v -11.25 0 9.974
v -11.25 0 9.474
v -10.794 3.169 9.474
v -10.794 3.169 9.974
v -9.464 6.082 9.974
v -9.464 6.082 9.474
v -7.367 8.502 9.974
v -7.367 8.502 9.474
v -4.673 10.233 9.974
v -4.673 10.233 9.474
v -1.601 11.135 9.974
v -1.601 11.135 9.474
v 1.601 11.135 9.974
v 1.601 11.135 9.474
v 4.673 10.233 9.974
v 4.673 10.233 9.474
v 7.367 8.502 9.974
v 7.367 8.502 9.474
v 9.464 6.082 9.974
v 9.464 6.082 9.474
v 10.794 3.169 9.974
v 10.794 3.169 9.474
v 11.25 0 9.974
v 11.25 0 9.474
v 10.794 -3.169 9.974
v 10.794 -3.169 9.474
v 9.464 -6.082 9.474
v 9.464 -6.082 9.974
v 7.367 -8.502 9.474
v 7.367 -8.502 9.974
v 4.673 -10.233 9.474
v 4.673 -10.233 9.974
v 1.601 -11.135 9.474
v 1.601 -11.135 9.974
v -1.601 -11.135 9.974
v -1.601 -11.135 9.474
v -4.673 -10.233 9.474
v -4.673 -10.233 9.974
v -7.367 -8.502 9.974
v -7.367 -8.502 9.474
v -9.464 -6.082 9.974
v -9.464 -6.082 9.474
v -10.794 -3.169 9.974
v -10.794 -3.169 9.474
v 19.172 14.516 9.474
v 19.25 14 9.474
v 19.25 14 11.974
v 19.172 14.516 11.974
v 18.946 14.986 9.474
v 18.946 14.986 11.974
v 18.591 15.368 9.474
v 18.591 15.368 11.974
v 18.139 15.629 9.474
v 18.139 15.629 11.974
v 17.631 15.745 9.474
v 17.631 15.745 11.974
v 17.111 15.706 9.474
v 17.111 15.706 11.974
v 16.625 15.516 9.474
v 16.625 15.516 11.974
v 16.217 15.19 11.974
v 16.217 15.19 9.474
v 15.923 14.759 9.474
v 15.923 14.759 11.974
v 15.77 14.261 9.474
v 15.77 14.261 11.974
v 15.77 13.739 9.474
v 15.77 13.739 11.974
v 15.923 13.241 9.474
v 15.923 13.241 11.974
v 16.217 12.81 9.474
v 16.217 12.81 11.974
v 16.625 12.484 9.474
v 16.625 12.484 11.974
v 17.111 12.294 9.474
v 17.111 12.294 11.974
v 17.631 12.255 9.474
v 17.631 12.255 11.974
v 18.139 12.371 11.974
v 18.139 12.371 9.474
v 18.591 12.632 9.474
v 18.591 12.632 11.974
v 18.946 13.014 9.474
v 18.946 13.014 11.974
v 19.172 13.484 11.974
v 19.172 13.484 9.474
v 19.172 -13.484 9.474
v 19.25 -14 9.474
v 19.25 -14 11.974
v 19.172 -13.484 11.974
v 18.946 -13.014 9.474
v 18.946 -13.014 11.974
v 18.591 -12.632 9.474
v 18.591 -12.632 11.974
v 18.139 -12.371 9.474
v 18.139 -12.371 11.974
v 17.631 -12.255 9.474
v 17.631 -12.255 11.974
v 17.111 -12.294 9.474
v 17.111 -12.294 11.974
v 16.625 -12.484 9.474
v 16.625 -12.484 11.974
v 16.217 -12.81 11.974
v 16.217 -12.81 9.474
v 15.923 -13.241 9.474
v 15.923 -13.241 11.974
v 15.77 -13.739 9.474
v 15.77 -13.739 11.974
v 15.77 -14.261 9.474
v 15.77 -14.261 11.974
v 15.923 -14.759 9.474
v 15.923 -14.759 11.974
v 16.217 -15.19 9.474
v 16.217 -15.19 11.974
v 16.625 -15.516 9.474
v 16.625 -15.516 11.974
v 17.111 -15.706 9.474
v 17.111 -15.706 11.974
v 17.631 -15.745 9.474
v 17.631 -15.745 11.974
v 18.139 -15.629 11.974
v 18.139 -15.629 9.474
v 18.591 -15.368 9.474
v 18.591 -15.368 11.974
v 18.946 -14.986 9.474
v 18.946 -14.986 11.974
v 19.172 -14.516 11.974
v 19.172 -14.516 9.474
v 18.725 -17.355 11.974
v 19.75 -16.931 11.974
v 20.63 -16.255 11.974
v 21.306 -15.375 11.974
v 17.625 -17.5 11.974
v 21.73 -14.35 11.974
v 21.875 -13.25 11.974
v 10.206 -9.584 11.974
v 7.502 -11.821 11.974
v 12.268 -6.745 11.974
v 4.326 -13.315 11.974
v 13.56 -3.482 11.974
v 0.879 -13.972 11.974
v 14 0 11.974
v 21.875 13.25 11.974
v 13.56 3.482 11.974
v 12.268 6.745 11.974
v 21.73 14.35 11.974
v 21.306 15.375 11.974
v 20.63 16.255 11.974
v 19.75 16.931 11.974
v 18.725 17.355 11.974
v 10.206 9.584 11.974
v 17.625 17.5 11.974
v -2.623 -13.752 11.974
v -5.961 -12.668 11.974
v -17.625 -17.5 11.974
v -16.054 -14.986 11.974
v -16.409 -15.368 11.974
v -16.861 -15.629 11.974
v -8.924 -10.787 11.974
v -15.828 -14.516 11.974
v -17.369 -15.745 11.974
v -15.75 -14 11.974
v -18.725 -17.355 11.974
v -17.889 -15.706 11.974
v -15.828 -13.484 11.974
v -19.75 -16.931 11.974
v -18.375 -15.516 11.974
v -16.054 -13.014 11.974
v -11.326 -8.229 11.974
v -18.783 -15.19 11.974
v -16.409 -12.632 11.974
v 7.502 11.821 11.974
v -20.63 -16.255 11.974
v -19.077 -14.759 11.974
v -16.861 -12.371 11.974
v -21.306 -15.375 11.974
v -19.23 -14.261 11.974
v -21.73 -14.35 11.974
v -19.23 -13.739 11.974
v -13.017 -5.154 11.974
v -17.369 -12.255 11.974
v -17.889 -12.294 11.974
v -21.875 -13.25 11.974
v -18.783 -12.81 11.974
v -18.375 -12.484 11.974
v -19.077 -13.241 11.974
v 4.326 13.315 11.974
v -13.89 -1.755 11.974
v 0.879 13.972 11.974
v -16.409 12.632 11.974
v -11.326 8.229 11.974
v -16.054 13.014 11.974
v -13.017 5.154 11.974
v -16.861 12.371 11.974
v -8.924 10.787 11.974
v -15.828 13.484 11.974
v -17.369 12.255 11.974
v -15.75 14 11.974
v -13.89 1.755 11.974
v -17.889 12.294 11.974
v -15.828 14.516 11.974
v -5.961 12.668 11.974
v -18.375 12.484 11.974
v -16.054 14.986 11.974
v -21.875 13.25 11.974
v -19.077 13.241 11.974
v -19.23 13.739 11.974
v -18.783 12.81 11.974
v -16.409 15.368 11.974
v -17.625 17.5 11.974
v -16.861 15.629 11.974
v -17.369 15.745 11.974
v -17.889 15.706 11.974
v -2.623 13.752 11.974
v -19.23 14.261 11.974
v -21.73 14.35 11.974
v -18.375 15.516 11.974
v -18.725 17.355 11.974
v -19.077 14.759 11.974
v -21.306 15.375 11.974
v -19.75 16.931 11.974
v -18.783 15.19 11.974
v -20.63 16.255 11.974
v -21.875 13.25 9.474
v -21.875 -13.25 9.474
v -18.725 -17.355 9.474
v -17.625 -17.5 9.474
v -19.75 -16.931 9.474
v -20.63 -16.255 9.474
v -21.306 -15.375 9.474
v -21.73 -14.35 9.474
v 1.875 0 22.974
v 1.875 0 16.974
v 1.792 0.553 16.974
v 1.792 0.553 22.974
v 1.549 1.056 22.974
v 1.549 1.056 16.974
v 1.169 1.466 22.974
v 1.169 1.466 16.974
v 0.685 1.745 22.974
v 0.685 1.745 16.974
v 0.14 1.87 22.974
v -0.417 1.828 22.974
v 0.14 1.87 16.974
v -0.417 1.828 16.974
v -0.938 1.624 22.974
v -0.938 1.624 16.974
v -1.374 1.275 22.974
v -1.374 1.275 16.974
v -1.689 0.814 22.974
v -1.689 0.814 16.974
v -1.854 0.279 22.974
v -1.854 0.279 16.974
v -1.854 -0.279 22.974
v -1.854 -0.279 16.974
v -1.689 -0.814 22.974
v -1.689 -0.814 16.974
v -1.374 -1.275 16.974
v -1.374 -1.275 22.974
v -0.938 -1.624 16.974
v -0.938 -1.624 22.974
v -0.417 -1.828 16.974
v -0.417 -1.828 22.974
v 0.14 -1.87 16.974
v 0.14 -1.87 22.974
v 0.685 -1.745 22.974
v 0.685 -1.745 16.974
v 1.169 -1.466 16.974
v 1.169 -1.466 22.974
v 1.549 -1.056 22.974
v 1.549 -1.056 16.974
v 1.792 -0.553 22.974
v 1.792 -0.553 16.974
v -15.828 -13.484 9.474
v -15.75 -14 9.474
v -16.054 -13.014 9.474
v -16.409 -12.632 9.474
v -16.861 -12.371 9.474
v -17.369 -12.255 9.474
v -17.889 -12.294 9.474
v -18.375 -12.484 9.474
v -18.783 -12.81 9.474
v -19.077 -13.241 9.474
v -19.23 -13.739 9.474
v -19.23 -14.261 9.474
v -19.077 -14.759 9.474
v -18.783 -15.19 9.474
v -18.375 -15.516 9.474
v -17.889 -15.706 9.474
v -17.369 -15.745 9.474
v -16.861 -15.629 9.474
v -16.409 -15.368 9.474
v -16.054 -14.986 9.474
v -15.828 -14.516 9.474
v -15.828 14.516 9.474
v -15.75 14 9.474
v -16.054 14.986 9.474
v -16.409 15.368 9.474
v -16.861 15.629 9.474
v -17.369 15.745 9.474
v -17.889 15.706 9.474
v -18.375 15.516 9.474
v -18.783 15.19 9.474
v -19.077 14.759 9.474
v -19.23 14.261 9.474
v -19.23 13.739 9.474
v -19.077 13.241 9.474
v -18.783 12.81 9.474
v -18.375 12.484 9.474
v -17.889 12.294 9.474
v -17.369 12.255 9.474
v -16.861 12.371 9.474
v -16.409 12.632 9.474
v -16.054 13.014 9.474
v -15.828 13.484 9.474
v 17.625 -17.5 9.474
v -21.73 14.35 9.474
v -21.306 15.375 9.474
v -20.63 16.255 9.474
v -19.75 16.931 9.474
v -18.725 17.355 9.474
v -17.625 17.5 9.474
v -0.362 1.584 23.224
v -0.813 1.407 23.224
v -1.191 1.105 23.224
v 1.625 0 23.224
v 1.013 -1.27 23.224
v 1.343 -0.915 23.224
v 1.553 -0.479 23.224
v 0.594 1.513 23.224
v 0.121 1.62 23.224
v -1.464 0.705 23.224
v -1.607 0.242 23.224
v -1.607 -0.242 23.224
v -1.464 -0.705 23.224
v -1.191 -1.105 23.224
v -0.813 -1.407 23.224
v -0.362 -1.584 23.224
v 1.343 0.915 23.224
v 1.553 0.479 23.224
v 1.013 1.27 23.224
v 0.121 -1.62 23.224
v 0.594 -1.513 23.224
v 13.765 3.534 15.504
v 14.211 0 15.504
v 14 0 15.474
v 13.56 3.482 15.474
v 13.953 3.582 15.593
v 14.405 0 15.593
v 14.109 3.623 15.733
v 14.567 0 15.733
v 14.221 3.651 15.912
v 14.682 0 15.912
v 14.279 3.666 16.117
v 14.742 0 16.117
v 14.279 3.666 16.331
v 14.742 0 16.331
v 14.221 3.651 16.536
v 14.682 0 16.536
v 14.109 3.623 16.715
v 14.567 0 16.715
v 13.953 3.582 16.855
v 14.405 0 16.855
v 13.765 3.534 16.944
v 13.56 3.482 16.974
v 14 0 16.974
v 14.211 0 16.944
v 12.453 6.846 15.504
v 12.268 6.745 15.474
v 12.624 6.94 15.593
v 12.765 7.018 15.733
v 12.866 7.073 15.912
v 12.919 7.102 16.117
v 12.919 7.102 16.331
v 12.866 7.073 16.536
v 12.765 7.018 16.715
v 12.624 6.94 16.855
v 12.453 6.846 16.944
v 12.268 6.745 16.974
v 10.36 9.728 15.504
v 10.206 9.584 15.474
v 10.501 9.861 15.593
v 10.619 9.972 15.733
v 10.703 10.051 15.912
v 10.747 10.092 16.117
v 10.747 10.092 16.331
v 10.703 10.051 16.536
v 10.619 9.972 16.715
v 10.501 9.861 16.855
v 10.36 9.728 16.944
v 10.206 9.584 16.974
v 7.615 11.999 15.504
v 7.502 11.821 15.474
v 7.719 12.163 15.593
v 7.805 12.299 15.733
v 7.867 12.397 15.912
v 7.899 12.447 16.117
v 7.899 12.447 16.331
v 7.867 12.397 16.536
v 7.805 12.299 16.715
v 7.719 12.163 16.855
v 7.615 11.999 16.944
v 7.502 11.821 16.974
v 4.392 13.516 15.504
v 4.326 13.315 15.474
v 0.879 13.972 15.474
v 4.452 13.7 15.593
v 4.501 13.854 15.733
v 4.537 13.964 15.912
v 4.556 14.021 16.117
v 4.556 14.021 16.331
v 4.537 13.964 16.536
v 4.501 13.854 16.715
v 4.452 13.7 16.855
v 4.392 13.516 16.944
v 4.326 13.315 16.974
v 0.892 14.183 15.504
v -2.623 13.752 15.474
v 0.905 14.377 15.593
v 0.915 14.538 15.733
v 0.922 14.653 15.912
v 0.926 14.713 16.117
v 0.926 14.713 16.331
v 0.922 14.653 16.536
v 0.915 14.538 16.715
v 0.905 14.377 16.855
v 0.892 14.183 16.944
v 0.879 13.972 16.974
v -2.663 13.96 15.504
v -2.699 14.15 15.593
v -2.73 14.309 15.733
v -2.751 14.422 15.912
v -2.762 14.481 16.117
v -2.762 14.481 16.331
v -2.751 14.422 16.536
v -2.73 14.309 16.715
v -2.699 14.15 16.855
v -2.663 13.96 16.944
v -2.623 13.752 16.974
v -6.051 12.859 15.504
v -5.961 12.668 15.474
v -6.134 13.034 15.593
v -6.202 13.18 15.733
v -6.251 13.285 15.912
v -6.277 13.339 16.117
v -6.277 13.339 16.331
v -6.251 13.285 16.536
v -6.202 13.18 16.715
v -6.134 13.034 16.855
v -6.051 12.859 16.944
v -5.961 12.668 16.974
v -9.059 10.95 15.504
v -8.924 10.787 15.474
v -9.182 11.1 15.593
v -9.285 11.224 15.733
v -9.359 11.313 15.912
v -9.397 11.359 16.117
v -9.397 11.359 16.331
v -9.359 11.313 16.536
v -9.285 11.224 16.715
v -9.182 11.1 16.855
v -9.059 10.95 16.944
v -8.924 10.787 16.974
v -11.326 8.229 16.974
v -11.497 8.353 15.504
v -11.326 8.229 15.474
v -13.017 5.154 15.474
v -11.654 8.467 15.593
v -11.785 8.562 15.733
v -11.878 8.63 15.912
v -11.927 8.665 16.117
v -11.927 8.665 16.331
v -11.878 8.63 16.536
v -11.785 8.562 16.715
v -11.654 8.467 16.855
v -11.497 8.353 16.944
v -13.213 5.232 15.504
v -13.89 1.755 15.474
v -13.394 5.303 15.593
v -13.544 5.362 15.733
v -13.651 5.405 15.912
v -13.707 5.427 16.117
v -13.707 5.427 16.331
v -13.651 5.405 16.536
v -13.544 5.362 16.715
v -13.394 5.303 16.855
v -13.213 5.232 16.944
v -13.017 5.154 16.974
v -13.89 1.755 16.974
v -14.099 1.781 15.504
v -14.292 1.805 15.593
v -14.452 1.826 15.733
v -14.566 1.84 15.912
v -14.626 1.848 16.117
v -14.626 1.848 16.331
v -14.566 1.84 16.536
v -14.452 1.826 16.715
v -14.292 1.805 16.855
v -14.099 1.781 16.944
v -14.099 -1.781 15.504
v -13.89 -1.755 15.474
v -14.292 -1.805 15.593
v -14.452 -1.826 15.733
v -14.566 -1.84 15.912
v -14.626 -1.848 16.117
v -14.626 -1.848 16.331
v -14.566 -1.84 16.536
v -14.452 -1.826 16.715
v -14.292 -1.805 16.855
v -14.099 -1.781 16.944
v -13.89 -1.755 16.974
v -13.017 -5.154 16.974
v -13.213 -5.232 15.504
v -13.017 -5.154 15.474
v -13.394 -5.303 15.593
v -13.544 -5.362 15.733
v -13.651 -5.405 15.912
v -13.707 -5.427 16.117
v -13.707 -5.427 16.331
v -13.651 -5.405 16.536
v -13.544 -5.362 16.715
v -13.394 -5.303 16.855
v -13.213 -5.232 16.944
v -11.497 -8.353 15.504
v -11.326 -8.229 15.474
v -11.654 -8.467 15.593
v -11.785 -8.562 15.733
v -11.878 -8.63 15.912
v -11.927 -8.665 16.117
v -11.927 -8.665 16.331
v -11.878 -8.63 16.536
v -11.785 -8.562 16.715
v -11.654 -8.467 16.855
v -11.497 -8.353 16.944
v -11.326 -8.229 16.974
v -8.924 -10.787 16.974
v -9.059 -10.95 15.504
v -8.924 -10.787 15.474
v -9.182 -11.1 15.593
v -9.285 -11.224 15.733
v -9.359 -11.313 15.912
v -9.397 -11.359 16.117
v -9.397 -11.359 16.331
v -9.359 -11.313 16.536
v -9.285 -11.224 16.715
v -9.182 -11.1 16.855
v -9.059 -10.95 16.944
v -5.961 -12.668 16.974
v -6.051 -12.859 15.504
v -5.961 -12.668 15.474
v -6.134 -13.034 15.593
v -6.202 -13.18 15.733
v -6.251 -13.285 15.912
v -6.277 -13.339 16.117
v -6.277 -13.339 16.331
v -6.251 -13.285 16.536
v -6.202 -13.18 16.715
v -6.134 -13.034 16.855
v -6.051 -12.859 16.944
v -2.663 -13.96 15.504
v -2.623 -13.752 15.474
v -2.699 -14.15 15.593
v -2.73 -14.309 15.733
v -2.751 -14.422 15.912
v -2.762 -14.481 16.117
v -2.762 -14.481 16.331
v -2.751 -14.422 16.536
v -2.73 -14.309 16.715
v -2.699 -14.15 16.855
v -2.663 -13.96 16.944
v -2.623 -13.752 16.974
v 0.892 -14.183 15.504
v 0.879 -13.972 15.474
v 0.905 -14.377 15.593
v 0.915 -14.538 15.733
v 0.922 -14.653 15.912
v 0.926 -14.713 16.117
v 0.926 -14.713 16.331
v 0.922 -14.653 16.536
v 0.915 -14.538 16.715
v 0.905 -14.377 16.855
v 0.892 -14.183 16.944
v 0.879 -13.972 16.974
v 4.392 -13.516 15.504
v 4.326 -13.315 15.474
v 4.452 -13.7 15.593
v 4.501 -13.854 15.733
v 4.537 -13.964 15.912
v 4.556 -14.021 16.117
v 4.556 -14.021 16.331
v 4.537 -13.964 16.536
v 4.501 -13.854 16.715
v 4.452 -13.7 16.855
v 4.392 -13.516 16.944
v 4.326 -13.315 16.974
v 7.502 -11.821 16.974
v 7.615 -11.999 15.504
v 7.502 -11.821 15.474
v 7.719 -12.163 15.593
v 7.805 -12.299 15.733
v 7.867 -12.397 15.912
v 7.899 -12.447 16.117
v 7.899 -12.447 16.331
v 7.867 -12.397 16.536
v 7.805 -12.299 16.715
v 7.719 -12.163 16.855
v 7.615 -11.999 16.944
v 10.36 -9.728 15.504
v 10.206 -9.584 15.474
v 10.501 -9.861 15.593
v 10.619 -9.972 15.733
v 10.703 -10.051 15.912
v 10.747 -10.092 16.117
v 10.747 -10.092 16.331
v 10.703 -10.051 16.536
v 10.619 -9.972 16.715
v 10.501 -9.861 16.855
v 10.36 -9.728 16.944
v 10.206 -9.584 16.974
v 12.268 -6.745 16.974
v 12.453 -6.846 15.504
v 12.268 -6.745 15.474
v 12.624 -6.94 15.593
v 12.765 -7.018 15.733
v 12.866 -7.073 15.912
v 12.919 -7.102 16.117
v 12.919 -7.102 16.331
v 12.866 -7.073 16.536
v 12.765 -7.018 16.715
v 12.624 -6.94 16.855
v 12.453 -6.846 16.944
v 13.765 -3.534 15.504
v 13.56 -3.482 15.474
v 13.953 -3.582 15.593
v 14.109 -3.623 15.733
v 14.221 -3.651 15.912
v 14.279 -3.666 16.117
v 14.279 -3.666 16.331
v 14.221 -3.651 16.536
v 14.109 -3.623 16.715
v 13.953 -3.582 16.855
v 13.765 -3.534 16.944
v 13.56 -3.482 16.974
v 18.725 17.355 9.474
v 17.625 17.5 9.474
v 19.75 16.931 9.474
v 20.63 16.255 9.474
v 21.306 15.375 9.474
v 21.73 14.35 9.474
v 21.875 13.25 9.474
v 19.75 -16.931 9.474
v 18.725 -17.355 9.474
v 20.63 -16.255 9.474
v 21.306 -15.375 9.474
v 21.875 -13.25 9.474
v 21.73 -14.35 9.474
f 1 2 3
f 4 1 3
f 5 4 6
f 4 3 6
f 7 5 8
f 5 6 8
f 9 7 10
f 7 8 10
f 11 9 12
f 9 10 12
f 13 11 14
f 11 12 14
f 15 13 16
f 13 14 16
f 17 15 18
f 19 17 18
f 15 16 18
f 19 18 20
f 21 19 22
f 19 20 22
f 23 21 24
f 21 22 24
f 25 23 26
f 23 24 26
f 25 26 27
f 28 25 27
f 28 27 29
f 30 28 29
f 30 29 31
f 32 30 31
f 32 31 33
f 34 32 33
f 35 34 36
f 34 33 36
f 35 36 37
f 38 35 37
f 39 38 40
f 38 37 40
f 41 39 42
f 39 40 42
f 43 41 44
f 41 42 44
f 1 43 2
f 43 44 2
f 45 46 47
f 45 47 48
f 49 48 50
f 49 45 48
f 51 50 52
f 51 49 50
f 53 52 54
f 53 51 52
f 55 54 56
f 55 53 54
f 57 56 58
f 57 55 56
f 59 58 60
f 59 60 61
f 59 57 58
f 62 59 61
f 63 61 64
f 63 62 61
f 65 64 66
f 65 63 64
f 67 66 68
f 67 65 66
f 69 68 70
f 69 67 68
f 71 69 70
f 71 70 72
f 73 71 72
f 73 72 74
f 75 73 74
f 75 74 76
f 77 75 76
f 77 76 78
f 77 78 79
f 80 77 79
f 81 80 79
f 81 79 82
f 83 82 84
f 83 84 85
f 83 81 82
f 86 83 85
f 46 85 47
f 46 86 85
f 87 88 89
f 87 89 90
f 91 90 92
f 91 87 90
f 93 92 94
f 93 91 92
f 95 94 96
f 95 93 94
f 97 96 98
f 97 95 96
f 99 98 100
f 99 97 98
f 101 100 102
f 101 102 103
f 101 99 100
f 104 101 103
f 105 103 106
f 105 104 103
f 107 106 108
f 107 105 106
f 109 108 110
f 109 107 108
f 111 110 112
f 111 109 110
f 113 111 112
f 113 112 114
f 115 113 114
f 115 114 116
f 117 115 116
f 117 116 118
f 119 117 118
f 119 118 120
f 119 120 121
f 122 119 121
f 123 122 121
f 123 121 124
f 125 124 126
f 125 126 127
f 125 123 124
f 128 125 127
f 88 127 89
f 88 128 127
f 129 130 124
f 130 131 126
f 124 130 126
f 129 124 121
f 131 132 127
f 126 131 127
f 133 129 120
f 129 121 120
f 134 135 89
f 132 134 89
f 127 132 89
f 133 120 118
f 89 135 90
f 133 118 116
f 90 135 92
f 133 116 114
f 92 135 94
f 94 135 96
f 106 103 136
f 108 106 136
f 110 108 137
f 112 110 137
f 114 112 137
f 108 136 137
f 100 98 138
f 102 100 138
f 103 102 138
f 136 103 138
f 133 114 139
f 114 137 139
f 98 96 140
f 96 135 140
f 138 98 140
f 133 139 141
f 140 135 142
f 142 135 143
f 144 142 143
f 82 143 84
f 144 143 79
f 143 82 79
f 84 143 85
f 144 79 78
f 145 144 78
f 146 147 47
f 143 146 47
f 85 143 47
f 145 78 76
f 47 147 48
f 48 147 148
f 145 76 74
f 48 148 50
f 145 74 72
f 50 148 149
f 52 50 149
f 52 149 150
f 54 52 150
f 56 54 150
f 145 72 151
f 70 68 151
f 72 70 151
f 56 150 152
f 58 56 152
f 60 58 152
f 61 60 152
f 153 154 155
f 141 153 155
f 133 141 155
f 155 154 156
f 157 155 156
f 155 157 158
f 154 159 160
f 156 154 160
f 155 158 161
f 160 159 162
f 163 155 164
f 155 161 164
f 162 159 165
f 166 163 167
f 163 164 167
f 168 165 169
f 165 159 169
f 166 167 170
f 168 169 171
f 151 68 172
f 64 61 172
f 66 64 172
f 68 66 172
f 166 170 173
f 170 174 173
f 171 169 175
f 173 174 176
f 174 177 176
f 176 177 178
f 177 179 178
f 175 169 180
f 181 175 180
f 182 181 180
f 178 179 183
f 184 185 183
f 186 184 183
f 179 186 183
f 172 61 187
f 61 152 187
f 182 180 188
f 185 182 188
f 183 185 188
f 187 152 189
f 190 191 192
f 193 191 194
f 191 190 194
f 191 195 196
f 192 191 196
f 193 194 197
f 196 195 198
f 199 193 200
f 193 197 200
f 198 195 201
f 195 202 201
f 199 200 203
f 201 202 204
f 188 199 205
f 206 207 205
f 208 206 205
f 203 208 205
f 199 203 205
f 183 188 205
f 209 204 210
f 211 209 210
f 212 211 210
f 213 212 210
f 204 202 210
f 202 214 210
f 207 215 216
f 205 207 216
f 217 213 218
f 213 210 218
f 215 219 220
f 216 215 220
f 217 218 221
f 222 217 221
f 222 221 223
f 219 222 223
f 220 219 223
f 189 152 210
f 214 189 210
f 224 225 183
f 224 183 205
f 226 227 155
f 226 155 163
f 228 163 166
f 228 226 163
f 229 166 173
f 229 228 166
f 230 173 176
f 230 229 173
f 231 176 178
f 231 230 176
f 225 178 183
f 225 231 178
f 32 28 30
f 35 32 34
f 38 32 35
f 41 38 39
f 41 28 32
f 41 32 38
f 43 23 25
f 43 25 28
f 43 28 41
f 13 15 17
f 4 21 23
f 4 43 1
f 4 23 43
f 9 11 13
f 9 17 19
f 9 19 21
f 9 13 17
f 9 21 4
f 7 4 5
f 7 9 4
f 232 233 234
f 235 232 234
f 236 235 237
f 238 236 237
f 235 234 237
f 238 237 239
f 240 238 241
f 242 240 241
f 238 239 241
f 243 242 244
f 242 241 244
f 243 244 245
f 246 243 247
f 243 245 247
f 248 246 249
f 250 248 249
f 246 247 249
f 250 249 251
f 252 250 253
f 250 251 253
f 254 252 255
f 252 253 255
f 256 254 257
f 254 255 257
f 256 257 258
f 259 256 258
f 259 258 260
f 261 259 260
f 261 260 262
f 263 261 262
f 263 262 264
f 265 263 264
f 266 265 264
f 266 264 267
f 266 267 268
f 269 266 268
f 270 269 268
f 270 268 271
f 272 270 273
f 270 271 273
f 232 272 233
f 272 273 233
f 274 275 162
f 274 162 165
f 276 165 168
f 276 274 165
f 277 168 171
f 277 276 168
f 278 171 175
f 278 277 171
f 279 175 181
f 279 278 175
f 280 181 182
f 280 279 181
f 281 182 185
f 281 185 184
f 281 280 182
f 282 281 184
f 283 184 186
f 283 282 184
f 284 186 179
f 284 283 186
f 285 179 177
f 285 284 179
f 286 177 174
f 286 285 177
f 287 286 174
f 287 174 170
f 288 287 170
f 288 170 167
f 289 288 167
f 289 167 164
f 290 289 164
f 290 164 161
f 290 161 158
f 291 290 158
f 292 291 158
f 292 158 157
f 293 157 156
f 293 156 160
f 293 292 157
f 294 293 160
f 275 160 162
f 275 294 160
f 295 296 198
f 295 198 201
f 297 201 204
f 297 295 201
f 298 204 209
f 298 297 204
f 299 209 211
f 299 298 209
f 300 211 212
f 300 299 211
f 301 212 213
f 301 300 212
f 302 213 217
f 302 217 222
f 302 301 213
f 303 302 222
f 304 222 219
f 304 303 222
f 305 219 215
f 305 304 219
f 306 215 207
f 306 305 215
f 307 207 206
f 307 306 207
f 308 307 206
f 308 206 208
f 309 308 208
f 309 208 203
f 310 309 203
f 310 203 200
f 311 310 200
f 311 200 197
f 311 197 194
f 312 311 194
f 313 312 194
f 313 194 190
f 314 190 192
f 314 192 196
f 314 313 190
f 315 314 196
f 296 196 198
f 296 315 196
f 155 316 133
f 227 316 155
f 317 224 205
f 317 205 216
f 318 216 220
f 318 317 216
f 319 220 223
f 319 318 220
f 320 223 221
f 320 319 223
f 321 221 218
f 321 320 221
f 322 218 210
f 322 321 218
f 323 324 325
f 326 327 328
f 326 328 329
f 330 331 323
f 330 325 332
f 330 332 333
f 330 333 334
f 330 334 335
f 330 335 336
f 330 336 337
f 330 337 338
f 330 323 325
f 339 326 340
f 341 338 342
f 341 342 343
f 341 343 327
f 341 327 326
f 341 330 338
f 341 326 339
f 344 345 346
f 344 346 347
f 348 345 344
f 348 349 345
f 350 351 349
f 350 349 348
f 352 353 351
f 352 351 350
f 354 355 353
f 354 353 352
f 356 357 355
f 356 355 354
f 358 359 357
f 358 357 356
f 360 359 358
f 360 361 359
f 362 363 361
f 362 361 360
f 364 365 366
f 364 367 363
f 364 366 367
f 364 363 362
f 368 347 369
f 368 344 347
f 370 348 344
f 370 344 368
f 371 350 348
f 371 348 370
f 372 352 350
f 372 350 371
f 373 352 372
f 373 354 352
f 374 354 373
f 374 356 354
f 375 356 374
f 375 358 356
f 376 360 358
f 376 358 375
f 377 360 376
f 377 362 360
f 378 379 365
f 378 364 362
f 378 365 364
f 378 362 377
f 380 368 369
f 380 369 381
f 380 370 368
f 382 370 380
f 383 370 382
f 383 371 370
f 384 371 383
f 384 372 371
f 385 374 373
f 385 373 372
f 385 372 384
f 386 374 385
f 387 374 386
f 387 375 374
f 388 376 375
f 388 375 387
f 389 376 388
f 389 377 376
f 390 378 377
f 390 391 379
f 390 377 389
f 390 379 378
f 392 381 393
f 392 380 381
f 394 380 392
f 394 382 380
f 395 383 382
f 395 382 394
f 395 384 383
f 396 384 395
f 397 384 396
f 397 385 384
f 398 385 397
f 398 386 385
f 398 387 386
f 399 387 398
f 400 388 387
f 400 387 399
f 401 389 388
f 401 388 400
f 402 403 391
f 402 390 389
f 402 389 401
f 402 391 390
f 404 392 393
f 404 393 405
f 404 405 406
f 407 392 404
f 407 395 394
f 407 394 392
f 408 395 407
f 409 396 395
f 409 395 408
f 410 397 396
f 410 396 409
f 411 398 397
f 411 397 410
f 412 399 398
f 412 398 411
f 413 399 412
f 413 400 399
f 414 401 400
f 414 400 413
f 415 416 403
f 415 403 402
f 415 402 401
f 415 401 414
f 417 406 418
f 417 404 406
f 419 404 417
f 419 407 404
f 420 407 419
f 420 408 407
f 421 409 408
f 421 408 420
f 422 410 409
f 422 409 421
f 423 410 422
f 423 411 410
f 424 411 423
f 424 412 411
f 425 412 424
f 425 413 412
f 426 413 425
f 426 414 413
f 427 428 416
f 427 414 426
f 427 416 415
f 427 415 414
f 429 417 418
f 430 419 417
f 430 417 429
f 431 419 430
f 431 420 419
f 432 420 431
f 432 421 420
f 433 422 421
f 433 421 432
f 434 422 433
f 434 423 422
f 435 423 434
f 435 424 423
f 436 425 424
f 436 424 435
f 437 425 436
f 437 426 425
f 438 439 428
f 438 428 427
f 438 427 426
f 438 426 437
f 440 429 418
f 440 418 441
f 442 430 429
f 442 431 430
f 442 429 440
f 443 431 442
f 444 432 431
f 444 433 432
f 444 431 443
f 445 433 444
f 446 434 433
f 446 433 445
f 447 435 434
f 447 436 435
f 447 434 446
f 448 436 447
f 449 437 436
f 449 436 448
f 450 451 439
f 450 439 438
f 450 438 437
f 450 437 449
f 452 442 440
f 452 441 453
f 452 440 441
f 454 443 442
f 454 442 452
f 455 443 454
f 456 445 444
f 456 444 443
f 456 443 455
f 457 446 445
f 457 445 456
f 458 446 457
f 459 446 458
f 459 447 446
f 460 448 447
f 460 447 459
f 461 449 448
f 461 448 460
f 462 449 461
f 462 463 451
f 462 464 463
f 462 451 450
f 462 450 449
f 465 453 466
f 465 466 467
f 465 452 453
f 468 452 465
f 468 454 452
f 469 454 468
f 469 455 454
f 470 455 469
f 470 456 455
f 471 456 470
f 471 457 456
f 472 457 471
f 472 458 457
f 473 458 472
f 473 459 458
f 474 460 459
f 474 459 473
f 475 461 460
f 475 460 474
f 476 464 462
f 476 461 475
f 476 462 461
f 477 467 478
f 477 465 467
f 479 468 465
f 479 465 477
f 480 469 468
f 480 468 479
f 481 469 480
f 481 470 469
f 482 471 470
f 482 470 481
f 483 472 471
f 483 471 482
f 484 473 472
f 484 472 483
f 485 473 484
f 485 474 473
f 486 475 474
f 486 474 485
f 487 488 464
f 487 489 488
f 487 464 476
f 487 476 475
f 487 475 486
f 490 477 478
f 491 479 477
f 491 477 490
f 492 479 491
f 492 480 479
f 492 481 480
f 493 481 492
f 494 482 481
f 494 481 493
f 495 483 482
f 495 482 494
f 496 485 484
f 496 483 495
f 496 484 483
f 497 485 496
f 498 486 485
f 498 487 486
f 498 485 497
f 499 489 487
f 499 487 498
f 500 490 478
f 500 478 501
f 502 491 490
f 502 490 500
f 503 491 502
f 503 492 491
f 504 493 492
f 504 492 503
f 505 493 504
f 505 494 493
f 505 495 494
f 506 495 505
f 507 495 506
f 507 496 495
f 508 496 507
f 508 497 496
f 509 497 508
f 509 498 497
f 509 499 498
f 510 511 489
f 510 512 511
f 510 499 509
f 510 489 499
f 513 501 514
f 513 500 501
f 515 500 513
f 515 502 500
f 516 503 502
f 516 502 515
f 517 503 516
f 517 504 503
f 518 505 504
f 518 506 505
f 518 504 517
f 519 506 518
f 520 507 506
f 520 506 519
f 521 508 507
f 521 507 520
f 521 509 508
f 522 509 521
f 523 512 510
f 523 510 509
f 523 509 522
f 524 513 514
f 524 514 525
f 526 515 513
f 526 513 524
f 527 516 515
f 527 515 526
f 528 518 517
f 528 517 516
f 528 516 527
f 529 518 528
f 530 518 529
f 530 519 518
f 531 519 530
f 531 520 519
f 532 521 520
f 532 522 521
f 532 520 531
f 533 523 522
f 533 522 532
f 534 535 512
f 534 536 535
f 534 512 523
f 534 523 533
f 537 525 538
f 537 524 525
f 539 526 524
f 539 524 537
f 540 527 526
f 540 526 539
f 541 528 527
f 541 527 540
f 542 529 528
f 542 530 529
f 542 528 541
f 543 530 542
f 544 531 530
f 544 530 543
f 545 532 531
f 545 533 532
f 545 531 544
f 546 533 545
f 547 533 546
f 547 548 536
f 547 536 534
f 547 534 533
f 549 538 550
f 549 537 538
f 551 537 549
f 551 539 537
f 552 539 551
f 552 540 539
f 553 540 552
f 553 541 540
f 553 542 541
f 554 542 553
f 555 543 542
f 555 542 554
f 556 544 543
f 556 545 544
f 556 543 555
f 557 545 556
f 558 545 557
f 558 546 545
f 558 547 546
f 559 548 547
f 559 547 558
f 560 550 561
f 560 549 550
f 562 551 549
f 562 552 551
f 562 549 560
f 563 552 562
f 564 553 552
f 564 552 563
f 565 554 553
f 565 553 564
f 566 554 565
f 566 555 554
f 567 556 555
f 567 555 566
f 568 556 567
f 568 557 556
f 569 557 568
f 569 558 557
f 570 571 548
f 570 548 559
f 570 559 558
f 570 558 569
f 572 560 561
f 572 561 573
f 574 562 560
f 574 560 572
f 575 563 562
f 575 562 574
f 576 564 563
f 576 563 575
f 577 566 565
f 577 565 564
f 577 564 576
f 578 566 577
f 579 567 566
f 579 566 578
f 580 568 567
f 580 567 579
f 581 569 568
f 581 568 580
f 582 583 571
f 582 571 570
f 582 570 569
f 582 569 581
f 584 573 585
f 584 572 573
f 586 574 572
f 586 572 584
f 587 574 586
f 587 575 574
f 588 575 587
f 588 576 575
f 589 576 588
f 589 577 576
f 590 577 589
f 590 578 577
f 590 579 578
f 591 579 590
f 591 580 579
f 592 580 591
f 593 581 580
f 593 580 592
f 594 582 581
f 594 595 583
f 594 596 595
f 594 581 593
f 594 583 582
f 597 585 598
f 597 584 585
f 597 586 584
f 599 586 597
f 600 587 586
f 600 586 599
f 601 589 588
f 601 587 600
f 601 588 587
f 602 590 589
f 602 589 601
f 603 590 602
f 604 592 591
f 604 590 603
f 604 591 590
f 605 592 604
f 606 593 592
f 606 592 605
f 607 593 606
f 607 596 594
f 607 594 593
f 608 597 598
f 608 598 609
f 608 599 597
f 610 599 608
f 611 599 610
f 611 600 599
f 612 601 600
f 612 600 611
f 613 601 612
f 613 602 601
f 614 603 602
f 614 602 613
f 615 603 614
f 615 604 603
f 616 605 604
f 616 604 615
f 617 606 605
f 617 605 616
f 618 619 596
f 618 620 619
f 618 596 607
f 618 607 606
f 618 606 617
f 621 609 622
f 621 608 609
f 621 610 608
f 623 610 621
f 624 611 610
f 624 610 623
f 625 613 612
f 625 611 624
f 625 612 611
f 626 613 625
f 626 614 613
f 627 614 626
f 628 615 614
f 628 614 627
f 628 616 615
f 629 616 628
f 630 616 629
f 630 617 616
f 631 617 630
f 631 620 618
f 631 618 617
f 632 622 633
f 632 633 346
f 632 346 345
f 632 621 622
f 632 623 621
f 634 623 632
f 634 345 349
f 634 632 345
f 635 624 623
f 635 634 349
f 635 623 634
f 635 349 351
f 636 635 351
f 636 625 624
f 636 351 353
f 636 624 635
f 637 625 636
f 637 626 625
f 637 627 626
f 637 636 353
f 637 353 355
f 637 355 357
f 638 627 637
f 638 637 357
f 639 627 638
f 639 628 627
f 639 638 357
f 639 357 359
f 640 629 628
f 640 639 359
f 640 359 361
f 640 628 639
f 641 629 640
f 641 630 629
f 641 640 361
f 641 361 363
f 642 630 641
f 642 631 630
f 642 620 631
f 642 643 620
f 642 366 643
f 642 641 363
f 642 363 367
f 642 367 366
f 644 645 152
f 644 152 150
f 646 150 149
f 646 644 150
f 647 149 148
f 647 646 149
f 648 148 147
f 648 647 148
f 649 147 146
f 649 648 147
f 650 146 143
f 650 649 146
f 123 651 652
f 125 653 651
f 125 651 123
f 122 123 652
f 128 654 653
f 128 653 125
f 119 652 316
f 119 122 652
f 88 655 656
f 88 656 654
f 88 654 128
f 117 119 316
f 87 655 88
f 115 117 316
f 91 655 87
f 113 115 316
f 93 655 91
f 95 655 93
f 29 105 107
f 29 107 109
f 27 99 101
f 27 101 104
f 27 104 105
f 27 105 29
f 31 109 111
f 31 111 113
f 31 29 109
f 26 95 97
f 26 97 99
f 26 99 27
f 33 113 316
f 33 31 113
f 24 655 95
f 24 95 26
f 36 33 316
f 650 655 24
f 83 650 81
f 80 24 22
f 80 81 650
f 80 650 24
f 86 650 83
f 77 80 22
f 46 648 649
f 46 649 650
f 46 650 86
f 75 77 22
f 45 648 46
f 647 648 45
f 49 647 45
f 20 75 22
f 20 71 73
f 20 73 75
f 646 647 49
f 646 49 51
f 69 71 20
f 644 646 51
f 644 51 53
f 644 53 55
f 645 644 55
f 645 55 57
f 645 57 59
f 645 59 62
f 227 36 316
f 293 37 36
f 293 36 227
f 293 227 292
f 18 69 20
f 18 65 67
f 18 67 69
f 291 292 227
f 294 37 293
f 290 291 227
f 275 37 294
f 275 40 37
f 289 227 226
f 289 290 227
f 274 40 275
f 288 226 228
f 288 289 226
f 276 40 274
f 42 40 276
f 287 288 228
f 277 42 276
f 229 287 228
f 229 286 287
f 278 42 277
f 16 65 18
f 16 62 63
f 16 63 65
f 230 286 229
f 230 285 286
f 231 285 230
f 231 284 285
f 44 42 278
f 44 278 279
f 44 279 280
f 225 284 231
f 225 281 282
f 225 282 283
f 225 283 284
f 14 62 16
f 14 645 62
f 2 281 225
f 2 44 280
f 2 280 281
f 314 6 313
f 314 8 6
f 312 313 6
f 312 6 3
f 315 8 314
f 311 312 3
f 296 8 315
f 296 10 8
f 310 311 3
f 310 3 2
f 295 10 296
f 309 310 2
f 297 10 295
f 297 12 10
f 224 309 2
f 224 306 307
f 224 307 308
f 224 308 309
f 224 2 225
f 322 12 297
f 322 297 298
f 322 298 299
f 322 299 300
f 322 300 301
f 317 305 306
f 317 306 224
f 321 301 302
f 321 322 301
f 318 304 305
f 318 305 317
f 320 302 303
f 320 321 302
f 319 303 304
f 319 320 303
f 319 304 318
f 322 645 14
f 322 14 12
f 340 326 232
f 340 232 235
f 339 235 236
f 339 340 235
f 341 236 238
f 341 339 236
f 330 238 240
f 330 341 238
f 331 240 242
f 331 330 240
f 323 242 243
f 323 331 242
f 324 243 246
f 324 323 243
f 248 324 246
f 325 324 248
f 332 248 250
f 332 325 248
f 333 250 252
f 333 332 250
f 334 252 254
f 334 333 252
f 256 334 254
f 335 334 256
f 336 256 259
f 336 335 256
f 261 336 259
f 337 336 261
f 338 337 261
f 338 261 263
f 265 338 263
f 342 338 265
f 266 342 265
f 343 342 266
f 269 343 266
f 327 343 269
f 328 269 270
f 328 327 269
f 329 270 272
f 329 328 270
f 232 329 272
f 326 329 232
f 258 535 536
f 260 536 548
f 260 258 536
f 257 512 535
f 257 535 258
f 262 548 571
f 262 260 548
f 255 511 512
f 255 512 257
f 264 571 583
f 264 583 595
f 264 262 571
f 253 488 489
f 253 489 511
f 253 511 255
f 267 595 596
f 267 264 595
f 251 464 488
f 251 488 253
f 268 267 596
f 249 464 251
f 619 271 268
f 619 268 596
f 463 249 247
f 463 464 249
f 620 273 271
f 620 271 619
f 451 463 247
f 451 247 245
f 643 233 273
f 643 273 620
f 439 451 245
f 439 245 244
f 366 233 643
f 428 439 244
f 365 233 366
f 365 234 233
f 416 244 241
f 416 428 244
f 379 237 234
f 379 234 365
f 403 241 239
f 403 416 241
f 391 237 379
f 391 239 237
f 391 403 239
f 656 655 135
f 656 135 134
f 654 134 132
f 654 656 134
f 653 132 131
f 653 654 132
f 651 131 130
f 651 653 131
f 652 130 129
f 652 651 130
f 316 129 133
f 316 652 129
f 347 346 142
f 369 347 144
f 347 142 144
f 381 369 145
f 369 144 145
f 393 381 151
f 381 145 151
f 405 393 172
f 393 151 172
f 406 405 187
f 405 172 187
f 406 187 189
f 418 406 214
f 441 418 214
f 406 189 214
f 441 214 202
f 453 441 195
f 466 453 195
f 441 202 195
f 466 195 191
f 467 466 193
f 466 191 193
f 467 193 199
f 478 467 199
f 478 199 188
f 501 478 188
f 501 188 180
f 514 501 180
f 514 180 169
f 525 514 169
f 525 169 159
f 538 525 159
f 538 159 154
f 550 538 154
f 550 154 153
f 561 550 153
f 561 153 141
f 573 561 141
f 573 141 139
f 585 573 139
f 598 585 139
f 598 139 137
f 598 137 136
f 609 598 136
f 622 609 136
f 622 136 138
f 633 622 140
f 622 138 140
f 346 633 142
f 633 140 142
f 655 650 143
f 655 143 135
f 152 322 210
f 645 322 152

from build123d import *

# Parameters (mm, degrees)
SKETCH1_R           = 7
BOSS_EXTRUDE1_DEPTH = 10
SKETCH2_R           = 56
BOSS_EXTRUDE2_DEPTH = 20
SKETCH3_R           = 3
SKETCH4_R           = 7.5
BOSS_EXTRUDE3_DEPTH = 25
CHAMFER1_SIZE       = 1
SKETCH5_R           = 45
CUT_EXTRUDE1_DEPTH  = 2
SCALE1_SCALE        = 0.25


with BuildPart() as part:
    # Sketch1 → Boss-Extrude1 (new body)
    with BuildSketch(Plane.XY):
        with BuildLine():
            Line((-70.5, 70), (70.5, 70))
            ThreePointArc((70.5, 70), (82.52081528, 65.02081528), (87.5, 53))
            Line((87.5, 53), (87.5, -53))
            ThreePointArc((87.5, -53), (82.52081528, -65.02081528), (70.5, -70))
            Line((70.5, -70), (-70.5, -70))
            ThreePointArc((-70.5, -70), (-82.52081528, -65.02081528), (-87.5, -53))
            Line((-87.5, -53), (-87.5, 53))
            ThreePointArc((-87.5, 53), (-82.52081528, 65.02081528), (-70.5, 70))
        make_face()
        with Locations((-70, 56)):
            Circle(SKETCH1_R, mode=Mode.SUBTRACT)
        with Locations((-70, -56)):
            Circle(SKETCH1_R, mode=Mode.SUBTRACT)
        with Locations((70, -56)):
            Circle(SKETCH1_R, mode=Mode.SUBTRACT)
        with Locations((70, 56)):
            Circle(SKETCH1_R, mode=Mode.SUBTRACT)
    extrude(amount=BOSS_EXTRUDE1_DEPTH)

    # Sketch2 → Boss-Extrude2 (add)
    with BuildSketch(Plane.XY.offset(10)):
        Circle(SKETCH2_R)
    extrude(amount=BOSS_EXTRUDE2_DEPTH)

    # Sketch3 → Revolve1 (revolve)
    with BuildSketch(Plane(origin=(0, 0, 0), x_dir=(1, 0, 0), z_dir=(0, 1, 0)), mode=Mode.PRIVATE) as revolve1_sk:
        with Locations((-56, -27)):
            Circle(SKETCH3_R)
    revolve(revolve1_sk.sketch.rotate(Axis((0, 0, 0), (0, 0, 1)), 180), axis=Axis((0, 0, 0), (0, 0, 1)))

    # Sketch4 → Boss-Extrude3 (add)
    with BuildSketch(Plane.XY.offset(30)):
        Circle(SKETCH4_R)
    extrude(amount=BOSS_EXTRUDE3_DEPTH)

    # Chamfer1
    chamfer1_edges = [part.edges().sort_by_distance(p)[0] for p in [
        (-7.5, 0, 55),
    ]]
    chamfer(chamfer1_edges, length=CHAMFER1_SIZE)

    # Sketch5 → Cut-Extrude1 (cut)
    with BuildSketch(Plane(origin=(0, 0, 0), x_dir=(-1, 0, 0), z_dir=(0, 0, -1))):
        Circle(SKETCH5_R)
    extrude(amount=-CUT_EXTRUDE1_DEPTH, mode=Mode.SUBTRACT)


with BuildPart() as part_1:
    # Scale1: scaled about (0, 0, 12.631964086)
    add(part.part.scale(SCALE1_SCALE).moved(Location((0, 0, 9.473973065))))


solid = part_1.part
